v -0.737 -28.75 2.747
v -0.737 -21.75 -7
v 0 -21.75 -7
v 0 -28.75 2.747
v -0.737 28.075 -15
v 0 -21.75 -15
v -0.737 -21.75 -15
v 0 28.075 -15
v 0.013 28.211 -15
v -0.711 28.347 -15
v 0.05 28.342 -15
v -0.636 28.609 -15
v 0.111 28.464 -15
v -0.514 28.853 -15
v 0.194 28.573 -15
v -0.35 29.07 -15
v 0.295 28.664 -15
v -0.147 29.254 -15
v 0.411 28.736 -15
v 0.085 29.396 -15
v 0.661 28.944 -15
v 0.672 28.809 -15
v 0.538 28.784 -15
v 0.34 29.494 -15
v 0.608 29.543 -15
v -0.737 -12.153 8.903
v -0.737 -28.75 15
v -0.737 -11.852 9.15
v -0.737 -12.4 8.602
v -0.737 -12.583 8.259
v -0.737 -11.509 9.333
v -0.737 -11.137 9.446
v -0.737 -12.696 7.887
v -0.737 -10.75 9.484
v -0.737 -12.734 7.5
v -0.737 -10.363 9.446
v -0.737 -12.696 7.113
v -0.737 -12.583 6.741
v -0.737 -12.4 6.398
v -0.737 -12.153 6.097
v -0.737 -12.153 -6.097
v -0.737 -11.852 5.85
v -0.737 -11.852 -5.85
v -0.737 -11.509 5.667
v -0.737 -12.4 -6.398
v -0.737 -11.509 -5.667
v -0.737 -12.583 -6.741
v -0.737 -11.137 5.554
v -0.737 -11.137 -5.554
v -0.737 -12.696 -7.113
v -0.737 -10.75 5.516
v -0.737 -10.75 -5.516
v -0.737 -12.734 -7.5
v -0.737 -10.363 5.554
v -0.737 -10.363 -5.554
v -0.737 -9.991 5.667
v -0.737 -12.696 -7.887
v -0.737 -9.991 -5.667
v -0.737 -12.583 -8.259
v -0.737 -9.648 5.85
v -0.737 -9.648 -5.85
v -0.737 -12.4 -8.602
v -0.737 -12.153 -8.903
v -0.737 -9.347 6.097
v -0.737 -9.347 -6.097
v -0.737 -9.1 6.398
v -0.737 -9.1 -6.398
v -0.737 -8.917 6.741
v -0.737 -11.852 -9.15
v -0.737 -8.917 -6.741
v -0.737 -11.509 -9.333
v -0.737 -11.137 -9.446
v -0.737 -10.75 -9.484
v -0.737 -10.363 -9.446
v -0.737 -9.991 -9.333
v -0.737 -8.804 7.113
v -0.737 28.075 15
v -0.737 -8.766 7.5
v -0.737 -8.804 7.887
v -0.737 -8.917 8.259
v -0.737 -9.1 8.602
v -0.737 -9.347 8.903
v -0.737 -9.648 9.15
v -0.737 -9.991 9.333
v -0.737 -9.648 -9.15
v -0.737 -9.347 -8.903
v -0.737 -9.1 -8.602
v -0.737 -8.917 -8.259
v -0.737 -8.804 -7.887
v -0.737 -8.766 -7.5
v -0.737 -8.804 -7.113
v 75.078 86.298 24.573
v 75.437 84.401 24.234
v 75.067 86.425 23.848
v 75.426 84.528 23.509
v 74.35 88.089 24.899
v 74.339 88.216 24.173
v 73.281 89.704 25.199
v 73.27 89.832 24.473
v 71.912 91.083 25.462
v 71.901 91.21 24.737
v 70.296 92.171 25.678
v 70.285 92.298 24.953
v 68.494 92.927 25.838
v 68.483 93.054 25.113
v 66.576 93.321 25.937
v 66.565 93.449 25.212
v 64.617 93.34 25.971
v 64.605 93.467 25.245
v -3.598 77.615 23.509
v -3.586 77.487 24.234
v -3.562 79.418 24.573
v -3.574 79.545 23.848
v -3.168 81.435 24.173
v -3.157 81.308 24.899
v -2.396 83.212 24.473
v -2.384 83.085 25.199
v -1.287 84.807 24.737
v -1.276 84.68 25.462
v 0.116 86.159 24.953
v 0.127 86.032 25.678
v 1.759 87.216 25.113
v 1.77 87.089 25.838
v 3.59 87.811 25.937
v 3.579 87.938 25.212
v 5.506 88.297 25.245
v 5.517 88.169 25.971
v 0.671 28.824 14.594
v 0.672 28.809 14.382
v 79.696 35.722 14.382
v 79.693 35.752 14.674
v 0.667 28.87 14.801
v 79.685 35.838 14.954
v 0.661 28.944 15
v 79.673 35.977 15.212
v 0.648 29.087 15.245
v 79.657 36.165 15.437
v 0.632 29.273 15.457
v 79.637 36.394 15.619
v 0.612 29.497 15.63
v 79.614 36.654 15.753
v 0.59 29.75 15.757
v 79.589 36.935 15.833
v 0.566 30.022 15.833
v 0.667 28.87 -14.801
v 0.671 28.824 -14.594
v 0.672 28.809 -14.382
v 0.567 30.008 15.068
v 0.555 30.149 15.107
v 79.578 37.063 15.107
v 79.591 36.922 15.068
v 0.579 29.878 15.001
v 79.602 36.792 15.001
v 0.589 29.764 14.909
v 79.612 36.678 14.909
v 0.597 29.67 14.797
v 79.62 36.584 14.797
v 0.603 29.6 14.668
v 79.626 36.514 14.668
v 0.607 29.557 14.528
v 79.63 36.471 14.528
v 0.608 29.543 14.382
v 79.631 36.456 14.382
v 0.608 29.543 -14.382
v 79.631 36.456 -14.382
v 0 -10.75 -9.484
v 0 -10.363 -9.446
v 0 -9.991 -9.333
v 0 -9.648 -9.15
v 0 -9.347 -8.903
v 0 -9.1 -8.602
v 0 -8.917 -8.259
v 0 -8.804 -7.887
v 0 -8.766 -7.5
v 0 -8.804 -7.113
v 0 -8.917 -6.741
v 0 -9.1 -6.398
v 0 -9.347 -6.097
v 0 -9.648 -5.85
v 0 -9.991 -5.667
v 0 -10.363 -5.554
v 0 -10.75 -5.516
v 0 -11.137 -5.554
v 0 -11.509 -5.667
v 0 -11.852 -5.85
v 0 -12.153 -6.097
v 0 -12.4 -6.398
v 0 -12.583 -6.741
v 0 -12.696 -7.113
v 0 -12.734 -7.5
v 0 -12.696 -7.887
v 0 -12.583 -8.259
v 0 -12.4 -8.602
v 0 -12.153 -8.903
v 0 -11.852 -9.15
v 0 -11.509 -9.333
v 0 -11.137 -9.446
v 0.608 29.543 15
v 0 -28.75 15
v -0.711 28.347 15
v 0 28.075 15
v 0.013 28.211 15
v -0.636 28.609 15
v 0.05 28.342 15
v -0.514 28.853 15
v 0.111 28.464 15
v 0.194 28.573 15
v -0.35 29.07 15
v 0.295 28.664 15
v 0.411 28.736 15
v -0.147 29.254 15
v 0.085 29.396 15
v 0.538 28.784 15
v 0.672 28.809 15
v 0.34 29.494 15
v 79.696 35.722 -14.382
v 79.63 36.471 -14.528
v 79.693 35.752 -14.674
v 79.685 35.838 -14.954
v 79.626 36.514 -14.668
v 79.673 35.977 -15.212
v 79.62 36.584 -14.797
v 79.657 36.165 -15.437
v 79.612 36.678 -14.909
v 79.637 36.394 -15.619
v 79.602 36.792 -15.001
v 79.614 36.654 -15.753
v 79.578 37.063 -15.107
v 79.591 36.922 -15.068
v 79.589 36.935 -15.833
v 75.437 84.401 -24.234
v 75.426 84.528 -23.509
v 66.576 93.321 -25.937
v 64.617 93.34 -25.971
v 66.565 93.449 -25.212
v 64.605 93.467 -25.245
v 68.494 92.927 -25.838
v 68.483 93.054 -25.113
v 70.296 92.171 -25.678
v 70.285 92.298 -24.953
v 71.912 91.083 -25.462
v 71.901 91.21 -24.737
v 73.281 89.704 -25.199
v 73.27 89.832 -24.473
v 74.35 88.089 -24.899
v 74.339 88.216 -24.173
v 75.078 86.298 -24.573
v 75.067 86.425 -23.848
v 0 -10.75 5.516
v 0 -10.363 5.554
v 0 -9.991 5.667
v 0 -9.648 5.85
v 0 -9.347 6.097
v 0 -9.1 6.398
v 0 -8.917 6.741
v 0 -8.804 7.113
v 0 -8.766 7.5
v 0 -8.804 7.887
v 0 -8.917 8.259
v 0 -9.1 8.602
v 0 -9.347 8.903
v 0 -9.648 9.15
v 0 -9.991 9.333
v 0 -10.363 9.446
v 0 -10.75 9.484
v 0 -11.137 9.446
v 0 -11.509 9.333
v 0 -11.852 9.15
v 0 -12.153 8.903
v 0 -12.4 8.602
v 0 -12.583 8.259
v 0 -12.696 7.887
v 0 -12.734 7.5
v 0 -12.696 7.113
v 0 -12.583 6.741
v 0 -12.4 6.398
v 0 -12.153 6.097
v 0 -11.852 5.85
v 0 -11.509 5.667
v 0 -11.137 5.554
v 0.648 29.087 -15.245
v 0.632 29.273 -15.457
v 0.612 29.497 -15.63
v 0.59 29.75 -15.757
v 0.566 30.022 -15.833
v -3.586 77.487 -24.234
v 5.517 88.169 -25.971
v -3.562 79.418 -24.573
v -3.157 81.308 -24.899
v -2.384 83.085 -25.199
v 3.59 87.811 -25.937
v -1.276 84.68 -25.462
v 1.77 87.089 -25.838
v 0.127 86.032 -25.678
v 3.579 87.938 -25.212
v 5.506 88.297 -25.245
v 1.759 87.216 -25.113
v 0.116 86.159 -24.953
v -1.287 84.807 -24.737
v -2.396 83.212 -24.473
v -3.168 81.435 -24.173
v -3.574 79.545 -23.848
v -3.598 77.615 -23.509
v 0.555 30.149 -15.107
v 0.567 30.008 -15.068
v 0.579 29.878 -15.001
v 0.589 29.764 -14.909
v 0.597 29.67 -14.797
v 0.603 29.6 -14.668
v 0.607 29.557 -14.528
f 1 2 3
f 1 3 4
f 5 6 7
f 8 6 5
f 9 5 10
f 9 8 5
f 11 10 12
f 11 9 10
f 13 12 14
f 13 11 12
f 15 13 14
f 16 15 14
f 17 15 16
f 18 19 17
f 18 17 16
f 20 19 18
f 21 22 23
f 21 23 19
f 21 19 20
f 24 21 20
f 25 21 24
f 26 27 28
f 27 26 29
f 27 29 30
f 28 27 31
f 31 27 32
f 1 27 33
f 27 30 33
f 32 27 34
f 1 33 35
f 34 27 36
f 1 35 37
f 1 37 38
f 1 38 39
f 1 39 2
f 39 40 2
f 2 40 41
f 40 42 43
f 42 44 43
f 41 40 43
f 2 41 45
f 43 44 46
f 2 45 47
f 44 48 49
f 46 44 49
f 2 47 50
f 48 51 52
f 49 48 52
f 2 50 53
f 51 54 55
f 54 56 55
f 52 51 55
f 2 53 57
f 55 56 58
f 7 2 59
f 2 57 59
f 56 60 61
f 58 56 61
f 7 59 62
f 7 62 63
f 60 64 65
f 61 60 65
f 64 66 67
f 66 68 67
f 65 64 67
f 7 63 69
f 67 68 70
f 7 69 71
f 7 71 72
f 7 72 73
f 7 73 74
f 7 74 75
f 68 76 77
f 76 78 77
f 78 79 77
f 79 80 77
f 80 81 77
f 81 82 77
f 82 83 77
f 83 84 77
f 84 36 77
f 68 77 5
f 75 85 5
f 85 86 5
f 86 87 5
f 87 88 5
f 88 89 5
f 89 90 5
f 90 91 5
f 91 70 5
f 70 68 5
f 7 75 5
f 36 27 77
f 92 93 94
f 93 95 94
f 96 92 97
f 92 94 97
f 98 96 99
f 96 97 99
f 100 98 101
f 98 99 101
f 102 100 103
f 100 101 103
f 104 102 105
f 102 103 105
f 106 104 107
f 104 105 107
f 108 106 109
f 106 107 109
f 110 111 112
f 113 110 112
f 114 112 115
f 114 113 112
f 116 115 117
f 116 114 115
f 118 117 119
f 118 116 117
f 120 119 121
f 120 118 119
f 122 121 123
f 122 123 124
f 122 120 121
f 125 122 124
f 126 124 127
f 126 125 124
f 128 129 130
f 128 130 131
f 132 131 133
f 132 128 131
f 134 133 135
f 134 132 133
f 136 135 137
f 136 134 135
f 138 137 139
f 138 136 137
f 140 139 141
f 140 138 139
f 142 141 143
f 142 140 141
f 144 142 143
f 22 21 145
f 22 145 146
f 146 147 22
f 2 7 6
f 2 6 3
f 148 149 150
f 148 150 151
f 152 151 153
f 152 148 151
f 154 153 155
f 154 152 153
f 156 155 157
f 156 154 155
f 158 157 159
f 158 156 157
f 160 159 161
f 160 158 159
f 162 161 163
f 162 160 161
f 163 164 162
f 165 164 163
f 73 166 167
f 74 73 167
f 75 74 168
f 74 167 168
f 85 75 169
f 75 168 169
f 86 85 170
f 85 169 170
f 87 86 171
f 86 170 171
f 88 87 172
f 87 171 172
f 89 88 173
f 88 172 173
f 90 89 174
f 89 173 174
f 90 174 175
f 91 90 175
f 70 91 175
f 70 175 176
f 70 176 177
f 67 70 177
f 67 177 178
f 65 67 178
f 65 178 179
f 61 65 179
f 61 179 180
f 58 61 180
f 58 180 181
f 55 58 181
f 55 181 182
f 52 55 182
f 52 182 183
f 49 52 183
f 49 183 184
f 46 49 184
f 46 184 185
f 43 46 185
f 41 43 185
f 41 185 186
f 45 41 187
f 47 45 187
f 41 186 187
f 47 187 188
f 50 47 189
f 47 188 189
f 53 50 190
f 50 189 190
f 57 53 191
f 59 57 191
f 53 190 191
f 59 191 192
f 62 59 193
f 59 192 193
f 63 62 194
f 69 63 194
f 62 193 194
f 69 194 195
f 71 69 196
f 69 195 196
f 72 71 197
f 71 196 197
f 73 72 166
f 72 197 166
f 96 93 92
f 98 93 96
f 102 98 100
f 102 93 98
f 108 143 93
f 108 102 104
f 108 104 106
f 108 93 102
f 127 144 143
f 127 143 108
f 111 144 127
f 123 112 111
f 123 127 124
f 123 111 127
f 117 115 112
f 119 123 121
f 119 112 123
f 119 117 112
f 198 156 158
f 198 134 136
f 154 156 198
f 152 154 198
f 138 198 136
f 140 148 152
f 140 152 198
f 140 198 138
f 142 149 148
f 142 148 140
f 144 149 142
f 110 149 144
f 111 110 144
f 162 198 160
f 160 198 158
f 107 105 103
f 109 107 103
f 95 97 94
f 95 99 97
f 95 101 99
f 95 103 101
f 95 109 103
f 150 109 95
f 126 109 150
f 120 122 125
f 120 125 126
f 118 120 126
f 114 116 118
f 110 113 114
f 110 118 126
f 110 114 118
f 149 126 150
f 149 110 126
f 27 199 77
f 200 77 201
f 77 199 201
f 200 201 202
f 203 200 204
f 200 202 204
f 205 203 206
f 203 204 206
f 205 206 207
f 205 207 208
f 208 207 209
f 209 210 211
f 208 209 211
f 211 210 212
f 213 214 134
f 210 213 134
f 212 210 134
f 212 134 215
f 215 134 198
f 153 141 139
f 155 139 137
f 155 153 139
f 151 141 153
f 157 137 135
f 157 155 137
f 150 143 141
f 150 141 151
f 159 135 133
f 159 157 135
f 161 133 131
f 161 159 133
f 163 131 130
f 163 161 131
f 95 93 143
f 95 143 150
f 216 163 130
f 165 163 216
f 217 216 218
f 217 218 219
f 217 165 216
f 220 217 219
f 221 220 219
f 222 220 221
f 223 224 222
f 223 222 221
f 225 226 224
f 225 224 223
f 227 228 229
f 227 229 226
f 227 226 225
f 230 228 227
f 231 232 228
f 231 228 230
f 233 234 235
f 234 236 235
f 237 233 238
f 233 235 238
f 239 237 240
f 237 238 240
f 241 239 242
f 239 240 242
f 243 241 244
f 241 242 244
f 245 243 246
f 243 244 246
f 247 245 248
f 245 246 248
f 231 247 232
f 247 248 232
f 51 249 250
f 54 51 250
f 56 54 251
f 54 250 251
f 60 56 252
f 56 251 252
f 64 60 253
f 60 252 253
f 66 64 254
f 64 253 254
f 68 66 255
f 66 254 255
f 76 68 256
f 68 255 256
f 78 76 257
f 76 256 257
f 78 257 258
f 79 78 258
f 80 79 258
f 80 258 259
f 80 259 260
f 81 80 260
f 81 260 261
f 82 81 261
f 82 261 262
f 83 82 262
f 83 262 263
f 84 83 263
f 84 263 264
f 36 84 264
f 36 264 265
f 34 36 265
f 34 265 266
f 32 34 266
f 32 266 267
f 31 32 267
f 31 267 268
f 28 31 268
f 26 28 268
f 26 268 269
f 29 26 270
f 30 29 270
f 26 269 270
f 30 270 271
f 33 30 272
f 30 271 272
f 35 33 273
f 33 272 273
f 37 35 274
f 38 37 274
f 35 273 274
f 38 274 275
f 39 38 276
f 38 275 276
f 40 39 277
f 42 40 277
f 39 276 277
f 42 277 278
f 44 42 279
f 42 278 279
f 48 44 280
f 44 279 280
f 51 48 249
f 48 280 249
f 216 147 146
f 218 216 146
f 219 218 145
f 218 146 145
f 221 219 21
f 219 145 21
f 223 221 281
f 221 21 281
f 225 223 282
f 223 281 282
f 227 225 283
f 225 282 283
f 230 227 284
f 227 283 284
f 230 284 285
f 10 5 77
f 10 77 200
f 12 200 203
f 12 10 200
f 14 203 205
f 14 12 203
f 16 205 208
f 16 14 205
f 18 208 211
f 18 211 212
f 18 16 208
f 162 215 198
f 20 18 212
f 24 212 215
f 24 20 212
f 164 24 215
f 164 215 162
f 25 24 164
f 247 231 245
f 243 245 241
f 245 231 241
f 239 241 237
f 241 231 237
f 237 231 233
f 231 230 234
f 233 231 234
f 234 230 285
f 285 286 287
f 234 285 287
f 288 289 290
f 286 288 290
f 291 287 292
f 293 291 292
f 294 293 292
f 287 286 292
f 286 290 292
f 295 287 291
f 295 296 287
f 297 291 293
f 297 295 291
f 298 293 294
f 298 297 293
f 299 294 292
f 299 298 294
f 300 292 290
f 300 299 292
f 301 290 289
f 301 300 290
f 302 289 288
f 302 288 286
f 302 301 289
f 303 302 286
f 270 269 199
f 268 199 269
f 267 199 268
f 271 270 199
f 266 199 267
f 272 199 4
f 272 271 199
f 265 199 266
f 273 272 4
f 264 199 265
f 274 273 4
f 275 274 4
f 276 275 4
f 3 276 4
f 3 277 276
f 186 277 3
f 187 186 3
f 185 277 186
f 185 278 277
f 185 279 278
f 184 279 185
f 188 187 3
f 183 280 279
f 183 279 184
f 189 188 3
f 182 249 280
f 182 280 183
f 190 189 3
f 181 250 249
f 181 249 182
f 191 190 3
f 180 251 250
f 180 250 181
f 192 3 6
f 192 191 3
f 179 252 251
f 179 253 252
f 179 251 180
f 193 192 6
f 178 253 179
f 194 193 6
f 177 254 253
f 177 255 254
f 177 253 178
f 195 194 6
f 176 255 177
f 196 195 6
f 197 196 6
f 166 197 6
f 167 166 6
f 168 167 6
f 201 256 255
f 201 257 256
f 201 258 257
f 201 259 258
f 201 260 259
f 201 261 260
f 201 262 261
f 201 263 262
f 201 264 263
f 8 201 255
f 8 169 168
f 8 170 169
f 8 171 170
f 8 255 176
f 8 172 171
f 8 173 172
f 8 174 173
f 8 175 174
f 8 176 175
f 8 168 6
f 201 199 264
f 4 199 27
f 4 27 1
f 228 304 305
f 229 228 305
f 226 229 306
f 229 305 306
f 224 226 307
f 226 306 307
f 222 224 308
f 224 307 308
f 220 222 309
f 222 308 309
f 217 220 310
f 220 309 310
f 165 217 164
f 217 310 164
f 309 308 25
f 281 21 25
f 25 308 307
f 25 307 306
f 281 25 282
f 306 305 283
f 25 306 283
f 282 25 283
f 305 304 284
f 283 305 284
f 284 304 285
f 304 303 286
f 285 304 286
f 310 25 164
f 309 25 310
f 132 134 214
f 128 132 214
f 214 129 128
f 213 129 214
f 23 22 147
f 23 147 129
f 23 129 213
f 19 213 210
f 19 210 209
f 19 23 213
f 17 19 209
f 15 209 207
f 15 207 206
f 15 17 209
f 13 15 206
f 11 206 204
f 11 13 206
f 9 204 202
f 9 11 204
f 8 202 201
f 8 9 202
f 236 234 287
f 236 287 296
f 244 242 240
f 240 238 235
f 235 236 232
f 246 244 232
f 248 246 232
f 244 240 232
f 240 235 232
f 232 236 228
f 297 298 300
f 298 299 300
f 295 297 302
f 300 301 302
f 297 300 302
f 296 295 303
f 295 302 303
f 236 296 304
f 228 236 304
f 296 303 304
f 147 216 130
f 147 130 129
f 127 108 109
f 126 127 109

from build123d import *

# Parameters (mm, degrees)
SKETCH1_W                    = 30
SKETCH1_H                    = 57.5
BASE_FLANGE1_DEPTH           = 0.7366
EDGE_FLANGE1_STRIP_CUT_DEPTH = 30
EDGE_FLANGE1_DEPTH           = 30
EDGE_FLANGE2_STRIP_CUT_DEPTH = 79.325030457
EDGE_FLANGE2_DEPTH           = 79.325030457
FILLET1_R                    = 10
CUT_EXTRUDE1_DEPTH           = 126.57552091
CUT_EXTRUDE1_DEPTH_BACK      = 126.57552091
SKETCH14_R                   = 1.984375
CUT_EXTRUDE2_DEPTH           = 126.57552091


# Sheet-metal steps are written as plain solids
with BuildPart() as part:
    # Sketch1 → Base-Flange1 (new body)
    with BuildSketch(Plane(origin=(0, 0, 0), x_dir=(0, 0, -1), z_dir=(1, 0, 0))):
        Rectangle(SKETCH1_W, SKETCH1_H)
    extrude(amount=-BASE_FLANGE1_DEPTH)

    # Edge-Flange1 strip (across the edge) → Edge-Flange1 strip cut (cut)
    with BuildSketch(Plane(origin=(0, 28.75, -15), x_dir=(0.087155742747662, -0.9961946980917452, 0), z_dir=(0, 0, 1))):
        Polygon((-3.794579928, -0.407430966), (0.60820216, -0.792624486), (0.67240108, -0.058827472), (-3.730381008, 0.326366049), align=None)
    extrude(amount=EDGE_FLANGE1_STRIP_CUT_DEPTH, mode=Mode.SUBTRACT)

    # Edge-Flange1 section (across the edge) → Edge-Flange1 (add)
    with BuildSketch(Plane(origin=(0, 28.75, -15), x_dir=(0.087155742747662, -0.9961946980917452, 0), z_dir=(0, 0, 1))):
        with BuildLine():
            Line((-0.7366, 0.674969543), (-0.7366, 80))
            Line((-0.7366, 80), (0, 80))
            Line((0, 80), (0, 0.674969543))
            ThreePointArc((0, 0.674969543), (0.193521514, 0.177329796), (0.67240108, -0.058827472))
            Line((0.67240108, -0.058827472), (0.60820216, -0.792624486))
            ThreePointArc((0.60820216, -0.792624486), (-0.349556973, -0.320309951), (-0.7366, 0.674969543))
        make_face()
    extrude(amount=EDGE_FLANGE1_DEPTH)

    # Edge-Flange2 strip (across the edge) → Edge-Flange2 strip cut (cut)
    with BuildSketch(Plane(origin=(0.60820216, 29.542624486, 15), x_dir=(-0.015134435901339633, 0.17298739392509335, -0.9848077530122075), z_dir=(0.9961946980917453, 0.08715574274766204, 0))):
        Polygon((-3.871674841, -0.065282507), (0.480781505, -0.832737993), (0.608690752, -0.107328603), (-3.743765593, 0.660126883), align=None)
    edge_flange2_strip_cut = extrude(amount=EDGE_FLANGE2_STRIP_CUT_DEPTH, mode=Mode.SUBTRACT)

    # Edge-Flange2 section (across the edge) → Edge-Flange2 (add)
    with BuildSketch(Plane(origin=(0.60820216, 29.542624486, 15), x_dir=(-0.015134435901339633, 0.17298739392509335, -0.9848077530122075), z_dir=(0.9961946980917453, 0.08715574274766204, 0))):
        with BuildLine():
            Line((-0.7366, 0.618080788), (-0.7366, 59))
            Line((-0.7366, 59), (0, 59))
            Line((0, 59), (0, 0.618080788))
            ThreePointArc((0, 0.618080788), (0.172331663, 0.144603435), (0.608690752, -0.107328603))
            Line((0.608690752, -0.107328603), (0.480781505, -0.832737993))
            ThreePointArc((0.480781505, -0.832737993), (-0.391936674, -0.328873918), (-0.7366, 0.618080788))
        make_face()
    edge_flange2 = extrude(amount=EDGE_FLANGE2_DEPTH)

    # Mirror1: Edge-Flange2 strip cut, Edge-Flange2 across plane
    add(edge_flange2_strip_cut.mirror(Plane.XY), mode=Mode.SUBTRACT)
    add(edge_flange2.mirror(Plane.XY))

    # Fillet1
    fillet1_edges = [part.edges().sort_by_distance(p)[0] for p in [
        (74.572883521, 94.275100646, -25.607947178),
        (-4.450291247, 87.361468698, -25.607947178),
        (-4.450291247, 87.361468698, 25.607947178),
        (74.572883521, 94.275100646, 25.607947178),
    ]]
    fillet(fillet1_edges, radius=FILLET1_R)

    # Sketch13 → Cut-Extrude1 (cut, two sides: drawn at the far end of the back side and taken through both)
    with BuildSketch(Plane(origin=(0, 0, 0), x_dir=(0, 0, -1), z_dir=(1, 0, 0)).offset(-CUT_EXTRUDE1_DEPTH_BACK)):
        Polygon((276.166836222, -21.75), (15, -21.75), (7, -21.75), (-2.746794345, -28.75), (-214.875081206, -181.097321129), (-53.649855395, -677.926156777), (437.392062033, -518.578835647), align=None)
    extrude(amount=CUT_EXTRUDE1_DEPTH + CUT_EXTRUDE1_DEPTH_BACK, mode=Mode.SUBTRACT)

    # Sketch14 → Cut-Extrude2 (cut, through all)
    with BuildSketch(Plane(origin=(0, 0, 0), x_dir=(0, 0, -1), z_dir=(1, 0, 0))):
        with Locations((-7.5, -10.75)):
            Circle(SKETCH14_R)
        with Locations((7.5, -10.75)):
            Circle(SKETCH14_R)
    extrude(amount=-CUT_EXTRUDE2_DEPTH, mode=Mode.SUBTRACT)


solid = part.part
